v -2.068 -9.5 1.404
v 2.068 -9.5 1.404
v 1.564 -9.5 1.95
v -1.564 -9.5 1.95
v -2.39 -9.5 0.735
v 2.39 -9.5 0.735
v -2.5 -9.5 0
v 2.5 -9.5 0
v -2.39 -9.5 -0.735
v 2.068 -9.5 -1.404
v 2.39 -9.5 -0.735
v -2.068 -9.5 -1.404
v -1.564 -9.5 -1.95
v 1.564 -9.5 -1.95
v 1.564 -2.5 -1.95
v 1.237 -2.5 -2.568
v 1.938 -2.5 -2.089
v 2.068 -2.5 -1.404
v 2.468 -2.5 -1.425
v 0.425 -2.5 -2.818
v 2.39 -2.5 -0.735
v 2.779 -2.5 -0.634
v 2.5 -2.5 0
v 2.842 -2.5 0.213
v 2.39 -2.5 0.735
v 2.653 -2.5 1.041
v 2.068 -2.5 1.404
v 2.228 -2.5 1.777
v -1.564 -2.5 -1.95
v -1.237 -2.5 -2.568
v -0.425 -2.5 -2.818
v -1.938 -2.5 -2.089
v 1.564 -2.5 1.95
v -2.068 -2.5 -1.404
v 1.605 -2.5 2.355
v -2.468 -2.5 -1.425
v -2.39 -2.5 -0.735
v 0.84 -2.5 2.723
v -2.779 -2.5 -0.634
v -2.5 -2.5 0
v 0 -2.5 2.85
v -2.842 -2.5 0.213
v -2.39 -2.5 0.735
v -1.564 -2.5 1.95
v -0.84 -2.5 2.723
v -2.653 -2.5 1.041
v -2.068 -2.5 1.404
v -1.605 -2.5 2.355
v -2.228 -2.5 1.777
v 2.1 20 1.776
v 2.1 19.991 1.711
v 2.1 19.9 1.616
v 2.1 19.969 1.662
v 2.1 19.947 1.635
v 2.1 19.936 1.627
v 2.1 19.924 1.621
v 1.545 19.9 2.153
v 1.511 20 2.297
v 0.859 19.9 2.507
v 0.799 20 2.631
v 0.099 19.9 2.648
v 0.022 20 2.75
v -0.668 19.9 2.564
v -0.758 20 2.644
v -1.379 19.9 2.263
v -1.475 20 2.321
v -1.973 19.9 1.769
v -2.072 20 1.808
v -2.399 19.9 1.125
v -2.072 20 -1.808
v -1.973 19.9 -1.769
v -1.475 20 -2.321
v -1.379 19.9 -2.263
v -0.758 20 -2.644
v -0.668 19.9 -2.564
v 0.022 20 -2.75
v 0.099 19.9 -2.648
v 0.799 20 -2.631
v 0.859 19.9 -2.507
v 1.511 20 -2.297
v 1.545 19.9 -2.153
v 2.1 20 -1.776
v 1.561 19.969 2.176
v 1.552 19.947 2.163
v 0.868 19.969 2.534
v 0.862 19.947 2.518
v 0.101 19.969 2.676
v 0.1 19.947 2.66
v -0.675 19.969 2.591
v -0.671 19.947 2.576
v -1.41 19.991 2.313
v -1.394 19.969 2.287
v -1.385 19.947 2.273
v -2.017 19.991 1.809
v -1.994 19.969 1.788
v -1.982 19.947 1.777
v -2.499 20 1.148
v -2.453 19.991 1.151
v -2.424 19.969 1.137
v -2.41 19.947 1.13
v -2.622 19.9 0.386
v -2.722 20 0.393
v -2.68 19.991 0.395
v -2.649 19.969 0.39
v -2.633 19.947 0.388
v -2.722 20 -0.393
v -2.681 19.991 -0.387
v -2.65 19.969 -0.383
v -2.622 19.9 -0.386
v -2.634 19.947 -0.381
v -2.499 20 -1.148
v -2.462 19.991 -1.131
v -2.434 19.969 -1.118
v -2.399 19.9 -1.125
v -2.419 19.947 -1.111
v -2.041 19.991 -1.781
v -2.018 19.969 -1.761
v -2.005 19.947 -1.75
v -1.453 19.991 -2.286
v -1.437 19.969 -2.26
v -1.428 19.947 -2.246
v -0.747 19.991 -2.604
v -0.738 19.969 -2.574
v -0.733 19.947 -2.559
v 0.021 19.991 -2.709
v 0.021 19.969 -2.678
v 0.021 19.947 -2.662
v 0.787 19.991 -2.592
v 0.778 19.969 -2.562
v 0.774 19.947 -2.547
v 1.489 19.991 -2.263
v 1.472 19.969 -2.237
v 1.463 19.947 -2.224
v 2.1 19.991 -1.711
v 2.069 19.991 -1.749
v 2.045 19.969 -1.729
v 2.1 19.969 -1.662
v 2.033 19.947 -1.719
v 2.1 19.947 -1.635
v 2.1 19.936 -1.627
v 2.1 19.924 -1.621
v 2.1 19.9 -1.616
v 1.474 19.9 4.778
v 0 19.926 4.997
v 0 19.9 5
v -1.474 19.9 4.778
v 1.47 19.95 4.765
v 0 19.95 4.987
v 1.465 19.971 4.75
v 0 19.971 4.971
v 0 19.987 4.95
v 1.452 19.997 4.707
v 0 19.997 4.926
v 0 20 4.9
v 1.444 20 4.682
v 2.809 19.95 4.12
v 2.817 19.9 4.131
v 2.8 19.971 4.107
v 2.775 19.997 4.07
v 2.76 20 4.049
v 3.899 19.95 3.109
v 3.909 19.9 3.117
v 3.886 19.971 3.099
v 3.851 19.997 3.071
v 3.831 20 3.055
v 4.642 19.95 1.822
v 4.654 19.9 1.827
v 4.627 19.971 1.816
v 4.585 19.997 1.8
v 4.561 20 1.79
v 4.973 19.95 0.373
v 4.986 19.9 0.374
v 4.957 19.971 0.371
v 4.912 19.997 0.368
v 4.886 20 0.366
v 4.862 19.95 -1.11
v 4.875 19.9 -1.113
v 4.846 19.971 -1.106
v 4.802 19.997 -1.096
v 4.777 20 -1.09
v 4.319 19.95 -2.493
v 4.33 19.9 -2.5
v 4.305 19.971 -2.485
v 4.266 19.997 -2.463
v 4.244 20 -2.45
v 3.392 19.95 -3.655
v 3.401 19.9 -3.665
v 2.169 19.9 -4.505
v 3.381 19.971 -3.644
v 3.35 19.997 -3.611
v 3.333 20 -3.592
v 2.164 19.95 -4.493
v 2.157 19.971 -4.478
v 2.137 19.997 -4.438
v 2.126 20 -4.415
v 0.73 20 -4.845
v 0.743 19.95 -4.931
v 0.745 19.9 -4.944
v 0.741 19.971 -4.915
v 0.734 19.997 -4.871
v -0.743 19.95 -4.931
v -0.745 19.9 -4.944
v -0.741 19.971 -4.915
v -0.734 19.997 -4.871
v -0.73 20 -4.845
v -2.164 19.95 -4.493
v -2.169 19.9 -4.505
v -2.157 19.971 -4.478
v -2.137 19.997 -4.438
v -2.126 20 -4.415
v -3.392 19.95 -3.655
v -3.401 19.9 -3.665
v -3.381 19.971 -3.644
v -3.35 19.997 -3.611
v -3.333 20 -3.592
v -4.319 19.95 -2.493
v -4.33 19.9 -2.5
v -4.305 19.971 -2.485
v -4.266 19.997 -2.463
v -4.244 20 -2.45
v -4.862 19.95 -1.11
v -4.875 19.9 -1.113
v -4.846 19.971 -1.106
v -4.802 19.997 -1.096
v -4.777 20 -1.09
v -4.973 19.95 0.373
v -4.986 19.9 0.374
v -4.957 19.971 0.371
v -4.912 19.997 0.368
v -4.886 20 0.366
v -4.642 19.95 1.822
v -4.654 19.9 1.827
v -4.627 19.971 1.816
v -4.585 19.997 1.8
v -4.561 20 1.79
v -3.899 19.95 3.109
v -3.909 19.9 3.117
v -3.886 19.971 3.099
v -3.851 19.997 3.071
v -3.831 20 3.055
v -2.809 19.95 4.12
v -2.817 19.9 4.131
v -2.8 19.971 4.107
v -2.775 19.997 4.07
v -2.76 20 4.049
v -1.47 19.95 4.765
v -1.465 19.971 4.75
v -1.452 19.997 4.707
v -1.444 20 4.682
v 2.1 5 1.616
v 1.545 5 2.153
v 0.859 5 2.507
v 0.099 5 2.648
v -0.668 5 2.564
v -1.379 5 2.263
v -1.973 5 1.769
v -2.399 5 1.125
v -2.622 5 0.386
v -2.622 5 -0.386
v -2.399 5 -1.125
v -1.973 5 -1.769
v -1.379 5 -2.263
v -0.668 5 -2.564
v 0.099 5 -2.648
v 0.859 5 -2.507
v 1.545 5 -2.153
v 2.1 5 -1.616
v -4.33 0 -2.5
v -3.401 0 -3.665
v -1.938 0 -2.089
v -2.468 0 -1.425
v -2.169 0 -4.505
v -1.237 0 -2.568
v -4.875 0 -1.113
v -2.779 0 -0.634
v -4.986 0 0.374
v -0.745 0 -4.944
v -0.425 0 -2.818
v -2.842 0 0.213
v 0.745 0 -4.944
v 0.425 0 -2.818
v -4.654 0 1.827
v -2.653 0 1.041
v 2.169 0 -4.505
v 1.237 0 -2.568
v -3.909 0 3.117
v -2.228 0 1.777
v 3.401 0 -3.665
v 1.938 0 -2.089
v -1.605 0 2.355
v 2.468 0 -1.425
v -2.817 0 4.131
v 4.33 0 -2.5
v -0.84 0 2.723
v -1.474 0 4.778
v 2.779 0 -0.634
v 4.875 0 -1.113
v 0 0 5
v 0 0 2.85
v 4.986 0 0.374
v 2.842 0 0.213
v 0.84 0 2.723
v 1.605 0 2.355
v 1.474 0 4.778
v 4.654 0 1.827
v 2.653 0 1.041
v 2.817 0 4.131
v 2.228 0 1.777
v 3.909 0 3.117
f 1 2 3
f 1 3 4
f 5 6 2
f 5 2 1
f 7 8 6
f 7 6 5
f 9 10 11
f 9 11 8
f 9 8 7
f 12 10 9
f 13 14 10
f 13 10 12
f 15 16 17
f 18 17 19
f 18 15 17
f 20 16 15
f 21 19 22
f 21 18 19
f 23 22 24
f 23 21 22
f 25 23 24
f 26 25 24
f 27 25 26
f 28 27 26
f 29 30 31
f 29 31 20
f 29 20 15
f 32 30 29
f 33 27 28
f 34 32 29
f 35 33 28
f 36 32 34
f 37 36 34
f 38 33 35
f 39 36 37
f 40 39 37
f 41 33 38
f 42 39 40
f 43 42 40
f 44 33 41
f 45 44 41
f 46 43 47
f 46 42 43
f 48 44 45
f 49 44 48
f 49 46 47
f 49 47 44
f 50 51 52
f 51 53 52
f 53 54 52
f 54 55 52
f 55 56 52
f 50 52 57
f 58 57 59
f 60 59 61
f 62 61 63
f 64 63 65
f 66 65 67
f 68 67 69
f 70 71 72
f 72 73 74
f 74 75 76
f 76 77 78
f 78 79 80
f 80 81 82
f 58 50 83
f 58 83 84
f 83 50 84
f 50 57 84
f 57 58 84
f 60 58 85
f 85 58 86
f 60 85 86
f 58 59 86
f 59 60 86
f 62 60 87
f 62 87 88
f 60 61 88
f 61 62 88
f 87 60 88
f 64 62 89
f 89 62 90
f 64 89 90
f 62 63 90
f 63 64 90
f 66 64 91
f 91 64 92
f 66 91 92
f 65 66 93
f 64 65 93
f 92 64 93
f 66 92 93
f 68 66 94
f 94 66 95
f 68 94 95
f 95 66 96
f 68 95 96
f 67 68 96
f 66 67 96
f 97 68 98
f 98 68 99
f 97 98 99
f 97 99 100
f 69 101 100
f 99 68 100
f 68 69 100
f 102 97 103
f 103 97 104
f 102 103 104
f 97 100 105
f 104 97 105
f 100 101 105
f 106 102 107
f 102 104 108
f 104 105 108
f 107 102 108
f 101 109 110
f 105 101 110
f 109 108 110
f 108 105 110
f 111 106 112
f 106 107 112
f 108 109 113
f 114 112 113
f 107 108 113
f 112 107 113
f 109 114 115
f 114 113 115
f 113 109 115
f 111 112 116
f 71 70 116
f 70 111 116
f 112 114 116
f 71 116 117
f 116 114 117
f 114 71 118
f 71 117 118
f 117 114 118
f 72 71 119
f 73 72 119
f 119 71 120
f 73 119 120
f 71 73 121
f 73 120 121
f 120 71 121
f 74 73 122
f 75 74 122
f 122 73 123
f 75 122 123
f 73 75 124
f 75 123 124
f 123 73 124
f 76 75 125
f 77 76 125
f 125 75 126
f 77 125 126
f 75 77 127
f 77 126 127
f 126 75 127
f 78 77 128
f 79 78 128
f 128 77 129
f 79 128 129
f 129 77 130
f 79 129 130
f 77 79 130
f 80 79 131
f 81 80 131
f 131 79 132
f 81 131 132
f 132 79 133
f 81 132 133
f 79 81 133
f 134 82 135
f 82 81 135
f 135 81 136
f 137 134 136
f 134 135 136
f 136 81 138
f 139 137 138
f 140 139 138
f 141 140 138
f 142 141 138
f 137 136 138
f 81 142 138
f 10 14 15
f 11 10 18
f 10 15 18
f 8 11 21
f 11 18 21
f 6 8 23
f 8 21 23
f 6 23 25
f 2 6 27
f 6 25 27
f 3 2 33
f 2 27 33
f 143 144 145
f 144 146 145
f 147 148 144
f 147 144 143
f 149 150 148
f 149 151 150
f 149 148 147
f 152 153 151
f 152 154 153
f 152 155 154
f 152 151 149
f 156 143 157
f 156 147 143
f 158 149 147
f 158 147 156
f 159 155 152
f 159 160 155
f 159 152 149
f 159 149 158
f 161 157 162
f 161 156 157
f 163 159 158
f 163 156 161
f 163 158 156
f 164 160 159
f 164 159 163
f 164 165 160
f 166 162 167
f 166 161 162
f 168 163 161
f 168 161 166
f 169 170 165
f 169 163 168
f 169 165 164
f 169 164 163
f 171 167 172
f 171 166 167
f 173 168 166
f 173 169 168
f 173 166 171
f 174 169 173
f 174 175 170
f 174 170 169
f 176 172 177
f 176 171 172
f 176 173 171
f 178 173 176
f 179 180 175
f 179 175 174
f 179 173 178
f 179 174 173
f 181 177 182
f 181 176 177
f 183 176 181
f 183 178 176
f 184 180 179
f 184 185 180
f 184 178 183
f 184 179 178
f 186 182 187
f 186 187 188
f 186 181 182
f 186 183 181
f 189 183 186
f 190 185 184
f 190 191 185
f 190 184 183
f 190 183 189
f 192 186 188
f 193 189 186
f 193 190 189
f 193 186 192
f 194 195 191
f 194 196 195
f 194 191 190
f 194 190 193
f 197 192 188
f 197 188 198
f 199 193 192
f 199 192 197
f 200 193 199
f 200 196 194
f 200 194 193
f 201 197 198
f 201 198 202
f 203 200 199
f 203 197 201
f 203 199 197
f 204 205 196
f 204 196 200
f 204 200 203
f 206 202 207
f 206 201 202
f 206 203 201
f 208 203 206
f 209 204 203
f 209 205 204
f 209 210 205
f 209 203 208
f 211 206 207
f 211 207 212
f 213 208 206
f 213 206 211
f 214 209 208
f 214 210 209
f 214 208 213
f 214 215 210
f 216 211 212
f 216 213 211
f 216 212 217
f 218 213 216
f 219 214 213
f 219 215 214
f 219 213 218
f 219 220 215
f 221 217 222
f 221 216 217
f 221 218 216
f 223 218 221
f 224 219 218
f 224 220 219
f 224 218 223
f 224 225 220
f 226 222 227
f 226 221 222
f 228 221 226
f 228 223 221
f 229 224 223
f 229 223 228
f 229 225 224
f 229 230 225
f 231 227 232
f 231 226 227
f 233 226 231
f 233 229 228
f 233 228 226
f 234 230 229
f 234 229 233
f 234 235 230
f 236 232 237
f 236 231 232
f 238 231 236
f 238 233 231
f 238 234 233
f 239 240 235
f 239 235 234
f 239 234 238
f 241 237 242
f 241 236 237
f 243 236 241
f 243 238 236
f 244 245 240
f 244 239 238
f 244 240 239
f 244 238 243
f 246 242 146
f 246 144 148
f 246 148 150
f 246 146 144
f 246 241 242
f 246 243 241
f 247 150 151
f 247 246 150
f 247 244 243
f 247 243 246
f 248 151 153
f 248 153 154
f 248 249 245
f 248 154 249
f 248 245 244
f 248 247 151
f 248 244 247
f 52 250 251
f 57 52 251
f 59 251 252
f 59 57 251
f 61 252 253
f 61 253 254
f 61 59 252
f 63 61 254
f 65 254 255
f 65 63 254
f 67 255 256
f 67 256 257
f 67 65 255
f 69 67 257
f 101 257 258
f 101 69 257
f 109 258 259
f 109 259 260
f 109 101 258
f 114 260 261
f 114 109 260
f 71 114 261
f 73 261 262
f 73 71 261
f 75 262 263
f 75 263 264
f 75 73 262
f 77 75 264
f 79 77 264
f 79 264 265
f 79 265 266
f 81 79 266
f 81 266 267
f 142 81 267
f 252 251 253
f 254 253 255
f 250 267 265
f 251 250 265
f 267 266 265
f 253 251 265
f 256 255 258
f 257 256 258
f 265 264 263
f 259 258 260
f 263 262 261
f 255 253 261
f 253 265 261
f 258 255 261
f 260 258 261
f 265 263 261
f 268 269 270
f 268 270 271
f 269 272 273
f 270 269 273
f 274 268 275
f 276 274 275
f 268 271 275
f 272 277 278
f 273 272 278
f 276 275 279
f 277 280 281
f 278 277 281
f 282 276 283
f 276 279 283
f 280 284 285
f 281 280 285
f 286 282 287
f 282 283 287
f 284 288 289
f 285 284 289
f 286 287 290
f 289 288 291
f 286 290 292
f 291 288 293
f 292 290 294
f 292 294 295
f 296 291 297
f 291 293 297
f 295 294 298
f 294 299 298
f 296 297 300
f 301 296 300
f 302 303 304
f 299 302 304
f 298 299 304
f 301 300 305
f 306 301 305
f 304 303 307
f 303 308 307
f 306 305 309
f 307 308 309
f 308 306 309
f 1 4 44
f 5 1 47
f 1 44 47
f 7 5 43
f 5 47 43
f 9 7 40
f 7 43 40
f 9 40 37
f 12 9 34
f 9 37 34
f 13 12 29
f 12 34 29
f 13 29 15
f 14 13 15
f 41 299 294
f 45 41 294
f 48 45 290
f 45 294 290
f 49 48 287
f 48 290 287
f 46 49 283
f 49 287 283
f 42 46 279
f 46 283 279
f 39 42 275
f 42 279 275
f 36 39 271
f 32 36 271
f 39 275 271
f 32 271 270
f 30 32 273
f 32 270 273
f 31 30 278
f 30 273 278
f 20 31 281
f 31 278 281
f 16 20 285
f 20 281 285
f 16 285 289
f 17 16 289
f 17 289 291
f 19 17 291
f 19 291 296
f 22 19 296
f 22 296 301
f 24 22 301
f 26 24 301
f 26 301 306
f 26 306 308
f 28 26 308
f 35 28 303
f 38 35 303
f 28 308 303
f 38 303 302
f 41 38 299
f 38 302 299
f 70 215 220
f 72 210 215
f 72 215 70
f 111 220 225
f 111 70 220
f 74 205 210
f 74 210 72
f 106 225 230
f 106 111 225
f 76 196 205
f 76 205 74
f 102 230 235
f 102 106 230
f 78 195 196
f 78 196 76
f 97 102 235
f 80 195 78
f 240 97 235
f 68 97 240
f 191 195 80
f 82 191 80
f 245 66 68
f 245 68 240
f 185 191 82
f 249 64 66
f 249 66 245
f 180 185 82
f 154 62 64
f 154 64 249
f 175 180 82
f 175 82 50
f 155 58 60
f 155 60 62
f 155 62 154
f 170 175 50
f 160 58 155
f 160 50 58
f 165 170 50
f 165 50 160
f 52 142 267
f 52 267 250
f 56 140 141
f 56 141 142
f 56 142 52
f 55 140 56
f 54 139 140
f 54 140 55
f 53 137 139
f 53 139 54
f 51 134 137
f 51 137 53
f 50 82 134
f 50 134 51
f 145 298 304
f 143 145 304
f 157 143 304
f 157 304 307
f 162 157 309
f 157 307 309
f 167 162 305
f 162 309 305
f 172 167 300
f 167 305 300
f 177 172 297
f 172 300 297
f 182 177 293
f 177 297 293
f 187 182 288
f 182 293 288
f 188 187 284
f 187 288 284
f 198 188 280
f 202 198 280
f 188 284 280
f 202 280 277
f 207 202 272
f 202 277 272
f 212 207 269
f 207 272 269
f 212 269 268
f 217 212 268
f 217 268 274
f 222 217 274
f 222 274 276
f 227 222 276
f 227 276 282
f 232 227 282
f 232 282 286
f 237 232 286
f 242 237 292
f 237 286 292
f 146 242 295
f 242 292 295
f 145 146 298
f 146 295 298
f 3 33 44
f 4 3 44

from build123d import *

# Parameters (mm, degrees)
SKETCH2_R           = 5
BOSS_EXTRUDE1_DEPTH = 20
CUT_EXTRUDE3_DEPTH  = 15
BOSS_EXTRUDE2_DEPTH = 9.5
SKETCH6_R           = 2.85
BOSS_EXTRUDE3_DEPTH = 2.5
FILLET3_R           = 0.1


with BuildPart() as part:
    # Sketch2 → Boss-Extrude1 (new body)
    with BuildSketch(Plane(origin=(0, 0, 0), x_dir=(1, 0, 0), z_dir=(0, 1, 0))):
        with Locations(Location((0, 0, 0), (0, 0, 270))):
            Circle(SKETCH2_R)
    extrude(amount=BOSS_EXTRUDE1_DEPTH)

    # Sketch3 → Cut-Extrude3 (cut)
    with BuildSketch(Plane(origin=(0, 20, 0), x_dir=(1, 0, 0), z_dir=(0, 1, 0))):
        with BuildLine():
            Line((2.1, 1.616322988), (2.1, -1.616322988))
            ThreePointArc((2.1, -1.616322988), (-2.65, 0), (2.1, 1.616322988))
        make_face()
    extrude(amount=-CUT_EXTRUDE3_DEPTH, mode=Mode.SUBTRACT)

    # Sketch4 → Boss-Extrude2 (add)
    with BuildSketch(Plane(origin=(0, 0, 0), x_dir=(-1, 0, 0), z_dir=(0, -1, 0))):
        with BuildLine():
            Line((1.564448785, 1.95), (-1.564448785, 1.95))
            ThreePointArc((-1.564448785, 1.95), (-2.5, 0), (-1.564448785, -1.95))
            Line((-1.564448785, -1.95), (1.564448785, -1.95))
            ThreePointArc((1.564448785, -1.95), (2.5, 0), (1.564448785, 1.95))
        make_face()
    extrude(amount=BOSS_EXTRUDE2_DEPTH)

    # Sketch6 → Boss-Extrude3 (add)
    with BuildSketch(Plane.XZ):
        with Locations(Location((0, 0, 0), (0, 0, 90))):
            Circle(SKETCH6_R)
    extrude(amount=BOSS_EXTRUDE3_DEPTH)

    # Fillet3
    fillet3_edges = [part.edges().sort_by_distance(p)[0] for p in [
        (0, 20, -5),
        (-2.65, 20, 0),
    ]]
    fillet(fillet3_edges, radius=FILLET3_R)


solid = part.part
